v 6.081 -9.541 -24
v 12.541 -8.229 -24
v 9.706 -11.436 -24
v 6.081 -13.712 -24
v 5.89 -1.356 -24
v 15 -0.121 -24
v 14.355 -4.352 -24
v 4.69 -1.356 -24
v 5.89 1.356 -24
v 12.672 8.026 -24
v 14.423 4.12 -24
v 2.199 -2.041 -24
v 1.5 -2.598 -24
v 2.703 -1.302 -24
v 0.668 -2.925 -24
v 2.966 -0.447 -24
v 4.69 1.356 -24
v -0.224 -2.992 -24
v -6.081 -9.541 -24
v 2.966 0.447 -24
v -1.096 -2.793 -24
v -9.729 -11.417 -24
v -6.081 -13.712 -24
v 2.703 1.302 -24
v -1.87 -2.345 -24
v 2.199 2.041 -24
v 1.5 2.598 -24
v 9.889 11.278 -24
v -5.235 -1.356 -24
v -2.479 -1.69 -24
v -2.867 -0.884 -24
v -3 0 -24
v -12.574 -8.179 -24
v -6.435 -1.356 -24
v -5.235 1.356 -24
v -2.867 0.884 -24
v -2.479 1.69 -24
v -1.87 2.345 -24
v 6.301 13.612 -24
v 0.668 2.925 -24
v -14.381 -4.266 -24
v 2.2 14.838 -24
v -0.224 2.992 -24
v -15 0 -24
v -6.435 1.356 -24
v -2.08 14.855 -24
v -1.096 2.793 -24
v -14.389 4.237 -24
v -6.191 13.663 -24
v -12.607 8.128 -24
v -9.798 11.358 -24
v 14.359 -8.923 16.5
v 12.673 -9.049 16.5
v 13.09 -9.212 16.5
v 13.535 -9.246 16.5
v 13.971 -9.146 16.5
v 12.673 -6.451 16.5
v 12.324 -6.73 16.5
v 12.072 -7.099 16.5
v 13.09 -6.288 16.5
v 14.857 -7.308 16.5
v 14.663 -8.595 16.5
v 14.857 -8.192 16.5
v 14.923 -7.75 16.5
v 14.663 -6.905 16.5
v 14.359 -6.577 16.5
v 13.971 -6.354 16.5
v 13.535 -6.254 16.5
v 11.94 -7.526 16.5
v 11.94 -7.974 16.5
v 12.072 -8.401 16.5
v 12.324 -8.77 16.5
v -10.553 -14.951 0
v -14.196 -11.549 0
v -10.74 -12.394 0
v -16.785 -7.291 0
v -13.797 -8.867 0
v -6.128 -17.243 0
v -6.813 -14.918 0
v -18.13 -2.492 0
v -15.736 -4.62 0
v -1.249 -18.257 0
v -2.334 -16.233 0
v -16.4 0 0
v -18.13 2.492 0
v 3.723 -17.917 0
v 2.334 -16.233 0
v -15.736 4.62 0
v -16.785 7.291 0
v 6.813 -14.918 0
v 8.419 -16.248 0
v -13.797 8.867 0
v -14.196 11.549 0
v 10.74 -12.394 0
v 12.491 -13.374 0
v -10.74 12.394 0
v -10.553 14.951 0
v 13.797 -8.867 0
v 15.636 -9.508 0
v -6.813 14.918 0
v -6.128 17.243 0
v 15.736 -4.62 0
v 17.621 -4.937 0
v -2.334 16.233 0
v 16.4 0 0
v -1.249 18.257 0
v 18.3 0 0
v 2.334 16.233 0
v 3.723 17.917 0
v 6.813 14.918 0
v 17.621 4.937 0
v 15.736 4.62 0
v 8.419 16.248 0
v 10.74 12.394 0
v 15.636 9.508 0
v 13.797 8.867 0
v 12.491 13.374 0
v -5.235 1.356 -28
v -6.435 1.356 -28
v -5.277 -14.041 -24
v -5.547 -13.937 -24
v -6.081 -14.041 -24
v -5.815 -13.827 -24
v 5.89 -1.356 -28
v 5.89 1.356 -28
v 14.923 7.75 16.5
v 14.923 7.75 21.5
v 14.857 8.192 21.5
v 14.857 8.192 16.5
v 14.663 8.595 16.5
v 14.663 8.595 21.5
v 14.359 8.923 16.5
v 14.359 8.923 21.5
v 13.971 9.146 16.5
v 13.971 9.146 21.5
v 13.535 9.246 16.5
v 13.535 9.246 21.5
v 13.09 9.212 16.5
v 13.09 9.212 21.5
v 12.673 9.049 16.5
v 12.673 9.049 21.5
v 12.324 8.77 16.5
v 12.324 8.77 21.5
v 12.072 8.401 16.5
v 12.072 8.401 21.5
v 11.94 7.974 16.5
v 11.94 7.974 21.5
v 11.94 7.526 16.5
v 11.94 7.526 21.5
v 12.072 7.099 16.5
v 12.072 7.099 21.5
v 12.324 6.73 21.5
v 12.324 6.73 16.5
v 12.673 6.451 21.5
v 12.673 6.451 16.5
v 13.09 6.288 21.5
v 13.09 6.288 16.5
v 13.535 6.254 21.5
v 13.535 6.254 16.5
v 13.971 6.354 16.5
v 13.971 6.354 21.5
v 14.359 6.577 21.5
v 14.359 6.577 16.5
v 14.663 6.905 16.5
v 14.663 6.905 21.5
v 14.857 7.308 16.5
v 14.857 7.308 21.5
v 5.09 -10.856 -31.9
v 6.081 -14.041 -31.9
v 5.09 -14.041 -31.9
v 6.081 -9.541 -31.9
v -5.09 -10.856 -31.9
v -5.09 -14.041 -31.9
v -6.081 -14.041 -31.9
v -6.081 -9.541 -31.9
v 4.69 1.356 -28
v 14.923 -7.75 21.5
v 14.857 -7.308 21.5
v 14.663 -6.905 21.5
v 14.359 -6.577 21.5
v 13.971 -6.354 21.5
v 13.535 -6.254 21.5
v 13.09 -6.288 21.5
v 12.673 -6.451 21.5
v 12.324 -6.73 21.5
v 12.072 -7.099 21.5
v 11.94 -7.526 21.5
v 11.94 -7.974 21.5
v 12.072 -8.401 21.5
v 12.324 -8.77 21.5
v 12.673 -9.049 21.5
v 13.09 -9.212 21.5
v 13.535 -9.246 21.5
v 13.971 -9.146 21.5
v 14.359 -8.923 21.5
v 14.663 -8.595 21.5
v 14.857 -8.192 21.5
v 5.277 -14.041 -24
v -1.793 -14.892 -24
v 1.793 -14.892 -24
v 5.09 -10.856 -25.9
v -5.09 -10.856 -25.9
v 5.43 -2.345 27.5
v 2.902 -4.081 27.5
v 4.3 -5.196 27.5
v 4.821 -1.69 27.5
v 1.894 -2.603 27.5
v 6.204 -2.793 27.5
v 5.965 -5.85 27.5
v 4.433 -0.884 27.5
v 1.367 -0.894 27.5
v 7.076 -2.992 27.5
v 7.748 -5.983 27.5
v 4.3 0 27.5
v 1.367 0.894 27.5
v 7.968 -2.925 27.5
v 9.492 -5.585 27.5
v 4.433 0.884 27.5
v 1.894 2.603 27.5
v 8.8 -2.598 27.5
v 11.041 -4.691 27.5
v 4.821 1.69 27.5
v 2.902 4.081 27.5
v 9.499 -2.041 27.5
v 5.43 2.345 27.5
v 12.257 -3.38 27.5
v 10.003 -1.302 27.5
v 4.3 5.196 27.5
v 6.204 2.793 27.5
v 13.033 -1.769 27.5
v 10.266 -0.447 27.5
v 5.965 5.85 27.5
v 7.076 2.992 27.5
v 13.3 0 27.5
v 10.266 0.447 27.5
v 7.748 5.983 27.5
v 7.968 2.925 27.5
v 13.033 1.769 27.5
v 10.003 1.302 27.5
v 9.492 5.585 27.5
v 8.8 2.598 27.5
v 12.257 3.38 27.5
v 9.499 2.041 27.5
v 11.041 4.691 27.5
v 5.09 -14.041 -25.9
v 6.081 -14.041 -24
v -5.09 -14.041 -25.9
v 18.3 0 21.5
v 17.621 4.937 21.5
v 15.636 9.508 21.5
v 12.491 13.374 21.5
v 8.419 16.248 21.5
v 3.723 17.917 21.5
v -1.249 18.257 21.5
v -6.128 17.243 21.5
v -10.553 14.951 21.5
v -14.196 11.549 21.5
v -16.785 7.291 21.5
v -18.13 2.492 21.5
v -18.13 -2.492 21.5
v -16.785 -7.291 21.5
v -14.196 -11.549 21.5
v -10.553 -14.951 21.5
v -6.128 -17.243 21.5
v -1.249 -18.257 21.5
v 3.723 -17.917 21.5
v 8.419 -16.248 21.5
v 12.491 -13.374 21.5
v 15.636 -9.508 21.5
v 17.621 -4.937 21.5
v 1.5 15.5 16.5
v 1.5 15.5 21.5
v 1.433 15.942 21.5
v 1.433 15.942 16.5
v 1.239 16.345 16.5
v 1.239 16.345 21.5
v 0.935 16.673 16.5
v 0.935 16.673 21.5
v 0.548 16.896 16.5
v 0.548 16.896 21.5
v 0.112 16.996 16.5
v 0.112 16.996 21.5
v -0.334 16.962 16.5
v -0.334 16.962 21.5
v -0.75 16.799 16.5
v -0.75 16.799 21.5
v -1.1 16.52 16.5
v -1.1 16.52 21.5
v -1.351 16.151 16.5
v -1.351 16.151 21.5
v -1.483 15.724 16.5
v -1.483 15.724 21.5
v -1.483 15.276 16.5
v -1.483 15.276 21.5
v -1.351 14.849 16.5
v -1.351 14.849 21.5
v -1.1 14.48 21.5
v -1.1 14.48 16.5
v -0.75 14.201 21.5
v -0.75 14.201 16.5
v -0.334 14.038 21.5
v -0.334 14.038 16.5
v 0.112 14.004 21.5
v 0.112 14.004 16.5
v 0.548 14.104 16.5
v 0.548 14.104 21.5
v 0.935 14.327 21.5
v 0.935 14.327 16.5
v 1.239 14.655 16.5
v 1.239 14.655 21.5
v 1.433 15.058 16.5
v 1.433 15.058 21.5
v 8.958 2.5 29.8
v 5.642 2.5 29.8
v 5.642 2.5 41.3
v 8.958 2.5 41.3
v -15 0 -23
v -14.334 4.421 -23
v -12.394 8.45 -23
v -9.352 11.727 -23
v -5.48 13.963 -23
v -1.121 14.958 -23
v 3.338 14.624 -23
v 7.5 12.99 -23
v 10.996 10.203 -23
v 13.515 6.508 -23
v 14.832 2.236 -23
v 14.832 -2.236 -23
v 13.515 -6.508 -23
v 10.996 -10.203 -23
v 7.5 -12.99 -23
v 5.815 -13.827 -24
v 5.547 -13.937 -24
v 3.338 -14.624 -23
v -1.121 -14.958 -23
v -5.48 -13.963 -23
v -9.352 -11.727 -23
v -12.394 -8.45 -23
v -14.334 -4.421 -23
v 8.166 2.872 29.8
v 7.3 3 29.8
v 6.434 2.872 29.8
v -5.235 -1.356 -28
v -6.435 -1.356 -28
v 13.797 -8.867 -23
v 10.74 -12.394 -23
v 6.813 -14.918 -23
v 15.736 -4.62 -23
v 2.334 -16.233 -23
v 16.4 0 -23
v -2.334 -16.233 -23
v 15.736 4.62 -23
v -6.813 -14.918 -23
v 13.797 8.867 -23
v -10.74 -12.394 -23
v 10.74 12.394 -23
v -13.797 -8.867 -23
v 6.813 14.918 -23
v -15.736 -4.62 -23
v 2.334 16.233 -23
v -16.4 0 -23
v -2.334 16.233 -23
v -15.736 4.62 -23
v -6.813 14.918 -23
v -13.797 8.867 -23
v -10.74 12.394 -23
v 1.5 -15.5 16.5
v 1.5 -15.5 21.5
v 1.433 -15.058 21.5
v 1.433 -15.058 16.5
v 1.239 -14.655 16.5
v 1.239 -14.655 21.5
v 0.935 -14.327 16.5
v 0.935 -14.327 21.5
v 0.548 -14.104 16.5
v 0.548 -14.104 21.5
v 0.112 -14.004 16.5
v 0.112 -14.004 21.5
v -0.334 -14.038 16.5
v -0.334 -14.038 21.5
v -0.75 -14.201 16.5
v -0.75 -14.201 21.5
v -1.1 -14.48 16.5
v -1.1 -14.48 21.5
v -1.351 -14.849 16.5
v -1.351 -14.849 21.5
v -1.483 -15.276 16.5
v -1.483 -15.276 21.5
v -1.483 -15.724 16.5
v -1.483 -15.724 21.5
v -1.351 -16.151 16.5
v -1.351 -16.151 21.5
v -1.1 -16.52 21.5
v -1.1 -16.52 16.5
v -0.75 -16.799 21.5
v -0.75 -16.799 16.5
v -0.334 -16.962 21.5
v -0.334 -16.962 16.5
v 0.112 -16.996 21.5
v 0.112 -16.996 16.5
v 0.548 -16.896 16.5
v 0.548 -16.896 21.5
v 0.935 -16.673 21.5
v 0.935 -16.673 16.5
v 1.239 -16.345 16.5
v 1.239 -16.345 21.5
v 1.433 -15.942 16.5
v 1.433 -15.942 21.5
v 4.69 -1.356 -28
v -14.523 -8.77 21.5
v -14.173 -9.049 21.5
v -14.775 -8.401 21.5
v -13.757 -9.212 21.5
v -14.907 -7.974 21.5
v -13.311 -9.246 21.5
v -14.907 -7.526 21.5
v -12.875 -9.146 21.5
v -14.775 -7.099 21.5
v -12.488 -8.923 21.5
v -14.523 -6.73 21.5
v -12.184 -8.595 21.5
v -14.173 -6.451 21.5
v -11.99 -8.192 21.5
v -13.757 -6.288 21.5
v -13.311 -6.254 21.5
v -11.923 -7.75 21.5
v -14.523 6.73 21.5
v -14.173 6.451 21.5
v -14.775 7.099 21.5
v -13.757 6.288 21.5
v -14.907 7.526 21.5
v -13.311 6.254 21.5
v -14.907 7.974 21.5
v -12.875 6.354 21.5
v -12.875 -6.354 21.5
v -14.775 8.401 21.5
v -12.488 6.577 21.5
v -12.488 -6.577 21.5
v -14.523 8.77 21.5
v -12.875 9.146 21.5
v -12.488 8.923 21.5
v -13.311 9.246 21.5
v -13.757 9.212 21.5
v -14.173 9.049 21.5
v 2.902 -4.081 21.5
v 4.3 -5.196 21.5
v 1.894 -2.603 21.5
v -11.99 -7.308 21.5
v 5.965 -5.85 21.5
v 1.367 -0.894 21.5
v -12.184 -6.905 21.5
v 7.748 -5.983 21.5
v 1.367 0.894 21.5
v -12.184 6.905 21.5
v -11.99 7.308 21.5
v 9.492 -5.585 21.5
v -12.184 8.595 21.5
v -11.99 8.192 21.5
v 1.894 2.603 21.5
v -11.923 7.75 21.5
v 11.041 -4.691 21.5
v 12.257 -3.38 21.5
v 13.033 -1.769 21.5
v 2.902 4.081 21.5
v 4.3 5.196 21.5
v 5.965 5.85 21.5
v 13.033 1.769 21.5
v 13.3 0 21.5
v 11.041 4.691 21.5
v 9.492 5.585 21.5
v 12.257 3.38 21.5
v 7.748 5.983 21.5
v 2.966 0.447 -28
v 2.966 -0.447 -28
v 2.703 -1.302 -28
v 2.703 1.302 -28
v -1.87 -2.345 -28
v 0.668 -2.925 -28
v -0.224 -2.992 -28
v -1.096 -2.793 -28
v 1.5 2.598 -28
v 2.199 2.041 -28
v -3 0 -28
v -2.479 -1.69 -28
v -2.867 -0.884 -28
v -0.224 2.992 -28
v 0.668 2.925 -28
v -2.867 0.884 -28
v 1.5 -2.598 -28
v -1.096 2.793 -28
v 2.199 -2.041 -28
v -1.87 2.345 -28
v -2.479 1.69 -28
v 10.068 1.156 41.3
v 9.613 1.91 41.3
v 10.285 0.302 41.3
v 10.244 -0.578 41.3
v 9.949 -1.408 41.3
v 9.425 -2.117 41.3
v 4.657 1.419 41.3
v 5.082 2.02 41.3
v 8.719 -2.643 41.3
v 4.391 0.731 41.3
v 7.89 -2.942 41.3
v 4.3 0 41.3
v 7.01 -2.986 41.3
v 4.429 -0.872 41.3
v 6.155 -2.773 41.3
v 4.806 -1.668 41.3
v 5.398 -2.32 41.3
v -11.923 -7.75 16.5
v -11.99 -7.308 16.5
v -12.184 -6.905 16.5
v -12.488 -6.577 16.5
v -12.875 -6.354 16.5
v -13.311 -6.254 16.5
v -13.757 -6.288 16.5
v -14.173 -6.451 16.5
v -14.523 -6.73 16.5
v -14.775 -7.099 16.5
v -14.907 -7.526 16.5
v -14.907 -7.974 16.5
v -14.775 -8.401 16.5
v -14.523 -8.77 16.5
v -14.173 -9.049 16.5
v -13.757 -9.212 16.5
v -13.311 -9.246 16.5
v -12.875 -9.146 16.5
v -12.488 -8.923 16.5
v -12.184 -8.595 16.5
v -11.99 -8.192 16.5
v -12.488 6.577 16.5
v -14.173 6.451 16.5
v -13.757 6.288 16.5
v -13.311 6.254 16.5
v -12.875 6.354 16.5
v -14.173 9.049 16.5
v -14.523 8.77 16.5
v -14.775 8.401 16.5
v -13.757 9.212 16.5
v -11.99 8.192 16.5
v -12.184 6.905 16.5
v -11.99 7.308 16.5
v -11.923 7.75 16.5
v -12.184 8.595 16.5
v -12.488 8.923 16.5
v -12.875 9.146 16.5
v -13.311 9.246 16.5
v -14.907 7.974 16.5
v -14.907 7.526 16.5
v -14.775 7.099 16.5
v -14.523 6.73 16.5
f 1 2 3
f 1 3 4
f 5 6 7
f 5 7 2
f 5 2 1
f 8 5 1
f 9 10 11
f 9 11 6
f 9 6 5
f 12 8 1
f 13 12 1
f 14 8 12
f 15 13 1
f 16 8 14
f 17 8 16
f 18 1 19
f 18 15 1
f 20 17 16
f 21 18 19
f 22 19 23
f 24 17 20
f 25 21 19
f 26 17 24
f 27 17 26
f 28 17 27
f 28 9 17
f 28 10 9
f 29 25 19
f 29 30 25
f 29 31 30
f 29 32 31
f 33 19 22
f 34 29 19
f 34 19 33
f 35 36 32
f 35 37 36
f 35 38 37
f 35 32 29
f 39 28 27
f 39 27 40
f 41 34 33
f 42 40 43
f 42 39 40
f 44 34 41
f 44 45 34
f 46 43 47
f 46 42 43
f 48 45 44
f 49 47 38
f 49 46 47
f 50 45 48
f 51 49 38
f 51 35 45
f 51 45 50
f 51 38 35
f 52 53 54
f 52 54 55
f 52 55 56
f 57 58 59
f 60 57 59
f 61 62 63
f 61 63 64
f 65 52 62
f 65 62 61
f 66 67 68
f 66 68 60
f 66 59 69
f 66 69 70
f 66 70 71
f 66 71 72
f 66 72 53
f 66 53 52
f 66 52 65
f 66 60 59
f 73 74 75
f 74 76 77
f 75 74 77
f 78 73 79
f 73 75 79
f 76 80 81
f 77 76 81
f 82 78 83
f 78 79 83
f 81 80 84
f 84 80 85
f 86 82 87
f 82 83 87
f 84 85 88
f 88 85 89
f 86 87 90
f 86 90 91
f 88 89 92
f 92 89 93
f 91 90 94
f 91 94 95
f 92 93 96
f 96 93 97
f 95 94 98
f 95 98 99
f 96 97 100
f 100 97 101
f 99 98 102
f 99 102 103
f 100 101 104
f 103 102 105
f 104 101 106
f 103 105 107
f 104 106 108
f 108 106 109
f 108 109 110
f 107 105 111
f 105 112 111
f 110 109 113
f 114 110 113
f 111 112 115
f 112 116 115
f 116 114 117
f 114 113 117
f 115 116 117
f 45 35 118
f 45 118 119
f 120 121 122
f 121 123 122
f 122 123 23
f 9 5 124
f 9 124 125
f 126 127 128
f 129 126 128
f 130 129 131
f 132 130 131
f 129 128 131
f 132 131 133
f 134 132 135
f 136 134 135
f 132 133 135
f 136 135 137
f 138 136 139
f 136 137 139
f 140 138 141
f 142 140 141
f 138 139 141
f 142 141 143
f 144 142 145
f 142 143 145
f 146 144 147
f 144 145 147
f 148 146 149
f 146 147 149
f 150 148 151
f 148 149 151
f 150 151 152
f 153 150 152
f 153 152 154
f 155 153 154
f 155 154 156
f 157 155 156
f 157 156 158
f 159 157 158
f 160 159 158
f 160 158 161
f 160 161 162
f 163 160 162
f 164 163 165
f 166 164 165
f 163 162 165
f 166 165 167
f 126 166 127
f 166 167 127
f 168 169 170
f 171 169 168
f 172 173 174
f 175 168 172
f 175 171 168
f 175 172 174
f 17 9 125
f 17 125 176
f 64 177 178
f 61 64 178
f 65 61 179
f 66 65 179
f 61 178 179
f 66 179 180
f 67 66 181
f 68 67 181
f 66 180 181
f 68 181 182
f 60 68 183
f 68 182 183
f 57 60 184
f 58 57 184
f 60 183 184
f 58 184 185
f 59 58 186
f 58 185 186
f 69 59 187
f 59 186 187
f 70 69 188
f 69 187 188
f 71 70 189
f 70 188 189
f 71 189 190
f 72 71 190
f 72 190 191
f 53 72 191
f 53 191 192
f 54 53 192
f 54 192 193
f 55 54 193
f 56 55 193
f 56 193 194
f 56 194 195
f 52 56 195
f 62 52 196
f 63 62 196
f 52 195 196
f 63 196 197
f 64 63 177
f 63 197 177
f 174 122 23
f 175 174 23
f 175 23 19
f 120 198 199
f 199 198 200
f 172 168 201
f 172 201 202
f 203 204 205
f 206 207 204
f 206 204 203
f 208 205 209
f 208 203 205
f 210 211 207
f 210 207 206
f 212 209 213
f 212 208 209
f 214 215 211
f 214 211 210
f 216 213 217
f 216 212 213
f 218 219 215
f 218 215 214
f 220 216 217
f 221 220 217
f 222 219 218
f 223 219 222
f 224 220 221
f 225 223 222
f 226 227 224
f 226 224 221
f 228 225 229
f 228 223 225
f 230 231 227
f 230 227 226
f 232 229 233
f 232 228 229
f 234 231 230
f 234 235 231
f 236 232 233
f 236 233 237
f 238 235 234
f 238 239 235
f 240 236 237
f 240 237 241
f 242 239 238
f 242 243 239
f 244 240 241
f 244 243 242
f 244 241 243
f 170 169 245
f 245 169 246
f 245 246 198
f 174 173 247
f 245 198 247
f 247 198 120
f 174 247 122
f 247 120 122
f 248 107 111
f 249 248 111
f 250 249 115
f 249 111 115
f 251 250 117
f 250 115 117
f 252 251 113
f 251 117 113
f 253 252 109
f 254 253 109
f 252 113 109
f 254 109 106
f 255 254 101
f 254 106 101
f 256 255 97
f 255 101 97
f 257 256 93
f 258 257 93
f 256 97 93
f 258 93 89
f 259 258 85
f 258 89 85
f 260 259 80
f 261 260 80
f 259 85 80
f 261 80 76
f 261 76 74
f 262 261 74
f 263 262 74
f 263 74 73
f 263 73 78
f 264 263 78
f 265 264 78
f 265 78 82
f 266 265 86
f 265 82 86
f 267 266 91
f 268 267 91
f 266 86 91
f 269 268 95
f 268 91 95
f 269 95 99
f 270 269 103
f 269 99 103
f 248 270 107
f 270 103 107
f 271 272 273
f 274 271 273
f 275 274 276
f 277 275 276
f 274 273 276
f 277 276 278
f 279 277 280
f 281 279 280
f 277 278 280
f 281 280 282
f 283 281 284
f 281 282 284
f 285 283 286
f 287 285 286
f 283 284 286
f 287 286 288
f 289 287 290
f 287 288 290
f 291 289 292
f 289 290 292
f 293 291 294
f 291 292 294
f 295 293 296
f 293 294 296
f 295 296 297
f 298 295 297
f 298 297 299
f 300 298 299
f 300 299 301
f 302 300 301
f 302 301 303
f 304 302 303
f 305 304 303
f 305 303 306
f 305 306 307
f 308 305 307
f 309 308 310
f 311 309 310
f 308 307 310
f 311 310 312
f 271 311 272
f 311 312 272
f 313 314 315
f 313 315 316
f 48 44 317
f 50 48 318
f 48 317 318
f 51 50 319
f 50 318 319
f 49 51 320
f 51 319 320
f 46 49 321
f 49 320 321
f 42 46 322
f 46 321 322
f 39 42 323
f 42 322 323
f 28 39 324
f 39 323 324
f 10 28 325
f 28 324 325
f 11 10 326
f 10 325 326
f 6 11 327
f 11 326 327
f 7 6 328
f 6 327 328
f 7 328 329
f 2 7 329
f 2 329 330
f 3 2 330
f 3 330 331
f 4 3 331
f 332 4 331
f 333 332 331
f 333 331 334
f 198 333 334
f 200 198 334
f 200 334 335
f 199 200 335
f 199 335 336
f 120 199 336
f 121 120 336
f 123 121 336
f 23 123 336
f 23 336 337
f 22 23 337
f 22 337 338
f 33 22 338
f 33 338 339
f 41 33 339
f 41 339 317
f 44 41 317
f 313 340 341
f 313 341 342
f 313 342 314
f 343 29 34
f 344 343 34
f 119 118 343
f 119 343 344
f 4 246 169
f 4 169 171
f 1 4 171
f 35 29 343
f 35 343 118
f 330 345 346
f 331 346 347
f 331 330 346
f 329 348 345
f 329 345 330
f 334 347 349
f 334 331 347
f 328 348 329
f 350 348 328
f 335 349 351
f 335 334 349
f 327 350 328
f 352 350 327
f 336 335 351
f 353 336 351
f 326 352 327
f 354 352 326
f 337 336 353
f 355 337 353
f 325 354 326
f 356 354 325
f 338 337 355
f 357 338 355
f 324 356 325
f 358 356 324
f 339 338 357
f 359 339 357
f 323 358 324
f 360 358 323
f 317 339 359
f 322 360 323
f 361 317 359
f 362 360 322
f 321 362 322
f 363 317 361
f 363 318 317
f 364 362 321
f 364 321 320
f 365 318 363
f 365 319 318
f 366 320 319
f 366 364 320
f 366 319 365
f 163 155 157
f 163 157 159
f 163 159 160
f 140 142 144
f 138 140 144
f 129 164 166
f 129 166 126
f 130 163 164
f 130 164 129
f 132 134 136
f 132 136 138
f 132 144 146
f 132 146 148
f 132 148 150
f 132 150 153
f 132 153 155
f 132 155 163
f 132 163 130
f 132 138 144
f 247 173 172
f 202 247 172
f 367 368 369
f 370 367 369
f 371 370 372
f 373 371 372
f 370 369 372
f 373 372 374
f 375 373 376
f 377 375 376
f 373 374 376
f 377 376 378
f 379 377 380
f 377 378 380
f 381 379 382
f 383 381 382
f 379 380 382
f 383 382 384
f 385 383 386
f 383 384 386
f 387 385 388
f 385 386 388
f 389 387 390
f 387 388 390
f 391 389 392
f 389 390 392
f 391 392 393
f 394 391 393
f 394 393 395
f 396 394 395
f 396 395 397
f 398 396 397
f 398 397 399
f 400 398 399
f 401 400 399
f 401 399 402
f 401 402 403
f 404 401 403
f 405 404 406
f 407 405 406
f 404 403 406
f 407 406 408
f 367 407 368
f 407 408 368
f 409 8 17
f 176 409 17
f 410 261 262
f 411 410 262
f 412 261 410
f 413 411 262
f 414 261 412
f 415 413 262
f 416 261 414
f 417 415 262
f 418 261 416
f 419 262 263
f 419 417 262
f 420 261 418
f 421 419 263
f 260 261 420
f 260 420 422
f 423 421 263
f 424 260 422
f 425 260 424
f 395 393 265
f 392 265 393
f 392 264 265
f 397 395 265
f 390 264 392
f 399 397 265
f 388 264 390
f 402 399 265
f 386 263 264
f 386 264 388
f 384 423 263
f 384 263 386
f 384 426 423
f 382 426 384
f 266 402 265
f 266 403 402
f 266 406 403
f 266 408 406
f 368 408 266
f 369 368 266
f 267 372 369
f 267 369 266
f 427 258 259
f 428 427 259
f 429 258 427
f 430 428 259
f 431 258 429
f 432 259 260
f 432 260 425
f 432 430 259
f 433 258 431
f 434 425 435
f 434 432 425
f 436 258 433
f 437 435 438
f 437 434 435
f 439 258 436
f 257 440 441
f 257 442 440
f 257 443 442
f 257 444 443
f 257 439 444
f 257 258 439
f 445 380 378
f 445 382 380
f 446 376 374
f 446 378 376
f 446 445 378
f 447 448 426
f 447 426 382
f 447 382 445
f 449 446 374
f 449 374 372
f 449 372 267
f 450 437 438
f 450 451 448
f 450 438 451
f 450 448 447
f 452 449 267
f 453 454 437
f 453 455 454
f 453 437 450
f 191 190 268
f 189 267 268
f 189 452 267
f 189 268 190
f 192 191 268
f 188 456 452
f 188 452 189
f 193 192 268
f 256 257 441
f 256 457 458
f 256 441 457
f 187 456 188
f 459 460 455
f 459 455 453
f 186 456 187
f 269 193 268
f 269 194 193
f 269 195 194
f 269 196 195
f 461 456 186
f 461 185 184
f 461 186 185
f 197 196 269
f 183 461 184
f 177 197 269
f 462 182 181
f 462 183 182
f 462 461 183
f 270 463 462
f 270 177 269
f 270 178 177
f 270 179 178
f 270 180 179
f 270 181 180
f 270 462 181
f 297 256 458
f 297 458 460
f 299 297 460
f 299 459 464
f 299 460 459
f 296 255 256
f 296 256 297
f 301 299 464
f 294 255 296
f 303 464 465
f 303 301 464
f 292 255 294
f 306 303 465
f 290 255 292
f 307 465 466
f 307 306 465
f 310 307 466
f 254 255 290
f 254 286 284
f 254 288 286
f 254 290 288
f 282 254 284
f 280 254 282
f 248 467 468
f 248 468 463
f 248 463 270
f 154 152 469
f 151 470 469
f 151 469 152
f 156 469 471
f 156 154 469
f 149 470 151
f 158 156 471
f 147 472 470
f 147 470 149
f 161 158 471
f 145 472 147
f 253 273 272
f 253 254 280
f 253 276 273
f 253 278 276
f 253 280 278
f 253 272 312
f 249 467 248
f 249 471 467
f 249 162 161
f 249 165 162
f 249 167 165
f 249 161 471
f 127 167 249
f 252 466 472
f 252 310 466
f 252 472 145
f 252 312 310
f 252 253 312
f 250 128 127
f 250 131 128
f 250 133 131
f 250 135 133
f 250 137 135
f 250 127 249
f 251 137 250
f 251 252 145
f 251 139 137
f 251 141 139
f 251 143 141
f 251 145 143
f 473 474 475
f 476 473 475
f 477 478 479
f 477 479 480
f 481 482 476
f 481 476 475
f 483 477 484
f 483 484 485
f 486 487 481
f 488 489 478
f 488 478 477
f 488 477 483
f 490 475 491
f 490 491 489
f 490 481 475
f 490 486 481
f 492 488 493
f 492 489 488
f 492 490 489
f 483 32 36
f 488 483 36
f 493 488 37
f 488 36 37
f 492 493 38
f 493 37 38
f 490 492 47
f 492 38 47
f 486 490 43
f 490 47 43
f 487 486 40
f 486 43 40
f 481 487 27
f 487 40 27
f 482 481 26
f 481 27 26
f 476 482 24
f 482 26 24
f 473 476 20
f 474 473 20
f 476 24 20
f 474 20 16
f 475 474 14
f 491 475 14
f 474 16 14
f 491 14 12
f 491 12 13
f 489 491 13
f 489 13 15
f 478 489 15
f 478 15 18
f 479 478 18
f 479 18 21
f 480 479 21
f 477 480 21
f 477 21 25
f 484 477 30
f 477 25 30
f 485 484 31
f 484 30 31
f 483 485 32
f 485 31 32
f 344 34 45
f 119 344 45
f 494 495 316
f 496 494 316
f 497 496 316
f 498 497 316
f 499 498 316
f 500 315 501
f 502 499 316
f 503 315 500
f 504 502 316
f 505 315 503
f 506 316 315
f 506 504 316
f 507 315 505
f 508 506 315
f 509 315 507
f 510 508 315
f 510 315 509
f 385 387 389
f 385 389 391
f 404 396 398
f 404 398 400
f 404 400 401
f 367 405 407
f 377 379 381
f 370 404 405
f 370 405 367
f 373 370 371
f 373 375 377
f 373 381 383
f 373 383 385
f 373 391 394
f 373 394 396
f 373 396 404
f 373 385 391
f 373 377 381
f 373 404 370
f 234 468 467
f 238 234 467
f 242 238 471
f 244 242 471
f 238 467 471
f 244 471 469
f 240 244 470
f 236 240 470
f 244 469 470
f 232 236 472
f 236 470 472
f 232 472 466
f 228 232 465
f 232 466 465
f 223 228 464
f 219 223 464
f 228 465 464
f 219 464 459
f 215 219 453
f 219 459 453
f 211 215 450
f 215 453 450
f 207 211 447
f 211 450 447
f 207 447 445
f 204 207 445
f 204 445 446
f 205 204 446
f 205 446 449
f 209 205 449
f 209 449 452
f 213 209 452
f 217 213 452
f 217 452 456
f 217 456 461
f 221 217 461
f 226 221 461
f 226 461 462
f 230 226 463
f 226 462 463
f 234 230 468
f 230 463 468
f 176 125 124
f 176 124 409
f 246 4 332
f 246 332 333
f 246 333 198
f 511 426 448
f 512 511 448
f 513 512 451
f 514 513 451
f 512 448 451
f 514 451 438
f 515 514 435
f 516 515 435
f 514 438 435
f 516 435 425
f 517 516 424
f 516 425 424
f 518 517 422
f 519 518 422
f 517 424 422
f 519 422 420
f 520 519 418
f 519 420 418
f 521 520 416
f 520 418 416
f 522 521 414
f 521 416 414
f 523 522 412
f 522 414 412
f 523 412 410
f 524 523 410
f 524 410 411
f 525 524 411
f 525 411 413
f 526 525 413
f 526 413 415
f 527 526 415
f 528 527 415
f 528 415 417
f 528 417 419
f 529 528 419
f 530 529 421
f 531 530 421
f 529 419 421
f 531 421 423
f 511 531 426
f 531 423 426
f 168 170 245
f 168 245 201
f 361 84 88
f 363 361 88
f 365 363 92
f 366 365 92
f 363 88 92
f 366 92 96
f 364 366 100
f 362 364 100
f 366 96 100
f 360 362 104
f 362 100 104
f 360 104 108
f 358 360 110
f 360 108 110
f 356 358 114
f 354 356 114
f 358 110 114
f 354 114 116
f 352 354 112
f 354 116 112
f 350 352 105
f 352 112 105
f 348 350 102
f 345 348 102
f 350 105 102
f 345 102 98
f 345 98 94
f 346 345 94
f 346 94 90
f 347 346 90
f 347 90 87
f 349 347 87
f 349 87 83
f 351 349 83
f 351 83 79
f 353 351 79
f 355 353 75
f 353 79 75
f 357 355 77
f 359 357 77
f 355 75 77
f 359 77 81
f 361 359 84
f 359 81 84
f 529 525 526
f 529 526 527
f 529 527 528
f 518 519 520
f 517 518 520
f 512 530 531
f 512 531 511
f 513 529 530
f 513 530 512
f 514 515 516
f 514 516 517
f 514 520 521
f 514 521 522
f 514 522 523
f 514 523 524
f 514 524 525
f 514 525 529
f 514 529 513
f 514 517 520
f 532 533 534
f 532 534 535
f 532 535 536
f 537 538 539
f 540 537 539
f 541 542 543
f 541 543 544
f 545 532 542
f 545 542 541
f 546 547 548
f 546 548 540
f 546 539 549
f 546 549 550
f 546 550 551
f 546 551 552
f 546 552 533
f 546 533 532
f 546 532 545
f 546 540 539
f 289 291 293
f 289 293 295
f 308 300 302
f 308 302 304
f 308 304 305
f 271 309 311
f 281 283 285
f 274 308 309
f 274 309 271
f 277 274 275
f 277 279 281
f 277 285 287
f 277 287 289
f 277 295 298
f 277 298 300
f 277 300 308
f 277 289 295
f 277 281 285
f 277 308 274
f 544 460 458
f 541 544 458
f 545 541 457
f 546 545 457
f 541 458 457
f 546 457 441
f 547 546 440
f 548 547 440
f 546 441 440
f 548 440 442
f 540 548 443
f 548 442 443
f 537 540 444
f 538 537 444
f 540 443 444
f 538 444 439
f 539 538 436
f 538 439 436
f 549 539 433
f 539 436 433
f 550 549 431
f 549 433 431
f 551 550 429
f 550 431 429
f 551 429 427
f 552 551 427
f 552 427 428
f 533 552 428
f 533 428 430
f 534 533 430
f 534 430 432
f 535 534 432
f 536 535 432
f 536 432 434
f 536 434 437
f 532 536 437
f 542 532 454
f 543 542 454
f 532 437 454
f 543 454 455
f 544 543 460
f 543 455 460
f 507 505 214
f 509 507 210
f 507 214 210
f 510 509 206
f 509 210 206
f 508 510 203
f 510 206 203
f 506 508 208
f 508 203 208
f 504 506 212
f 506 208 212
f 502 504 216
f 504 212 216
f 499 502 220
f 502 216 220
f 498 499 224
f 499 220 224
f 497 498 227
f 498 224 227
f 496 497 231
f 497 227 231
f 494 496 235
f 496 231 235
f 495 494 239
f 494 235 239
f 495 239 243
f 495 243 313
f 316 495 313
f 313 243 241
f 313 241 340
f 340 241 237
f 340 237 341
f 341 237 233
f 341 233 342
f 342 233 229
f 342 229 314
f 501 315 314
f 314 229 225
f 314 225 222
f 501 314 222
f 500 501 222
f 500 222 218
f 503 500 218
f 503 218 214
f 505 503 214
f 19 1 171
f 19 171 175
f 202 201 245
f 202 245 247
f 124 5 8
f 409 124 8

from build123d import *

# Parameters (mm, degrees)
SKETCH_1_R          = 18.3
EXTRUDE_1_DEPTH     = 21.5
SKETCH_2_R          = 1.5
CUT_EXTRUDE_1_DEPTH = 5
SKETCH_3_R          = 6
EXTRUDE_2_DEPTH     = 6
SKETCH_4_R          = 3
EXTRUDE_3_DEPTH     = 13.8
CUT_EXTRUDE_START   = -11.5
CUT_EXTRUDE_2_DEPTH = 11.5
SKETCH_6_R          = 16.4
EXTRUDE_4_DEPTH     = 23
SKETCH_7_R          = 15
EXTRUDE_5_DEPTH     = 1
SKETCH_8_R          = 3
EXTRUDE_6_DEPTH     = 4
SKETCH_9_W          = 12.161670498
SKETCH_9_H          = 4.500444444
EXTRUDE_7_DEPTH     = 7.9
SKETCH_10_W         = 1.2
SKETCH_10_H         = 2.711111112
EXTRUDE_8_DEPTH     = 4
SKETCH_11_W         = 10.179858782
SKETCH_11_H         = 6.369590588
CUT_EXTRUDE_3_DEPTH = 6


with BuildPart() as part:
    # 草图1 → 凸台-拉伸1 (new body)
    with BuildSketch(Plane.XY):
        Circle(SKETCH_1_R)
    extrude(amount=EXTRUDE_1_DEPTH)

    # 草图2 → 切除-拉伸1 (cut)
    with BuildSketch(Plane.XY.offset(21.5)):
        with Locations((0, 15.5)):
            Circle(SKETCH_2_R)
        with Locations((13.423393759, 7.75)):
            Circle(SKETCH_2_R)
        with Locations((13.423393759, -7.75)):
            Circle(SKETCH_2_R)
        with Locations((0, -15.5)):
            Circle(SKETCH_2_R)
        with Locations((-13.423393759, -7.75)):
            Circle(SKETCH_2_R)
        with Locations((-13.423393759, 7.75)):
            Circle(SKETCH_2_R)
    extrude(amount=-CUT_EXTRUDE_1_DEPTH, mode=Mode.SUBTRACT)

    # 草图3 → 凸台-拉伸2 (add)
    with BuildSketch(Plane.XY.offset(21.5)):
        with Locations((7.3, 0)):
            Circle(SKETCH_3_R)
    extrude(amount=EXTRUDE_2_DEPTH)

    # 草图4 → 凸台-拉伸3 (add)
    with BuildSketch(Plane.XY.offset(27.5)):
        with Locations(Location((7.3, 0, 0), (0, 0, 180))):
            Circle(SKETCH_4_R)
    extrude(amount=EXTRUDE_3_DEPTH)

    # 草图5 → 切除-拉伸2 (cut)
    with BuildSketch(Plane.XY.offset(41.3).offset(CUT_EXTRUDE_START)):
        with BuildLine():
            Line((5.641687605, 2.5), (8.958312395, 2.5))
            ThreePointArc((8.958312395, 2.5), (7.3, 3), (5.641687605, 2.5))
        make_face()
    extrude(amount=CUT_EXTRUDE_2_DEPTH, mode=Mode.SUBTRACT)

    # 草图6 → 凸台-拉伸4 (add)
    with BuildSketch(Plane(origin=(0, 0, 0), x_dir=(-1, 0, 0), z_dir=(0, 0, -1))):
        Circle(SKETCH_6_R)
    extrude(amount=EXTRUDE_4_DEPTH)

    # 草图7 → 凸台-拉伸5 (add)
    with BuildSketch(Plane(origin=(0, 0, -23), x_dir=(-1, 0, 0), z_dir=(0, 0, -1))):
        Circle(SKETCH_7_R)
    extrude(amount=EXTRUDE_5_DEPTH)

    # 草图8 → 凸台-拉伸6 (add)
    with BuildSketch(Plane(origin=(0, 0, -24), x_dir=(-1, 0, 0), z_dir=(0, 0, -1))):
        Circle(SKETCH_8_R)
    extrude(amount=EXTRUDE_6_DEPTH)

    # 草图9 → 凸台-拉伸7 (add)
    with BuildSketch(Plane(origin=(0, 0, -24), x_dir=(-1, 0, 0), z_dir=(0, 0, -1))):
        with Locations((0, -11.791042912)):
            Rectangle(SKETCH_9_W, SKETCH_9_H)
    extrude(amount=EXTRUDE_7_DEPTH)

    # 草图10 → 凸台-拉伸8 (add)
    with BuildSketch(Plane(origin=(0, 0, -24), x_dir=(-1, 0, 0), z_dir=(0, 0, -1))):
        with Locations((-5.289655172, 0)):
            Rectangle(SKETCH_10_W, SKETCH_10_H)
        with Locations((5.835249042, 0)):
            Rectangle(SKETCH_10_W, SKETCH_10_H)
    extrude(amount=EXTRUDE_8_DEPTH)

    # 草图11 → 切除-拉伸3 (cut)
    with BuildSketch(Plane(origin=(0, 0, -31.9), x_dir=(-1, 0, 0), z_dir=(0, 0, -1))):
        with Locations((0, -14.041265134)):
            Rectangle(SKETCH_11_W, SKETCH_11_H)
    extrude(amount=-CUT_EXTRUDE_3_DEPTH, mode=Mode.SUBTRACT)


solid = part.part
